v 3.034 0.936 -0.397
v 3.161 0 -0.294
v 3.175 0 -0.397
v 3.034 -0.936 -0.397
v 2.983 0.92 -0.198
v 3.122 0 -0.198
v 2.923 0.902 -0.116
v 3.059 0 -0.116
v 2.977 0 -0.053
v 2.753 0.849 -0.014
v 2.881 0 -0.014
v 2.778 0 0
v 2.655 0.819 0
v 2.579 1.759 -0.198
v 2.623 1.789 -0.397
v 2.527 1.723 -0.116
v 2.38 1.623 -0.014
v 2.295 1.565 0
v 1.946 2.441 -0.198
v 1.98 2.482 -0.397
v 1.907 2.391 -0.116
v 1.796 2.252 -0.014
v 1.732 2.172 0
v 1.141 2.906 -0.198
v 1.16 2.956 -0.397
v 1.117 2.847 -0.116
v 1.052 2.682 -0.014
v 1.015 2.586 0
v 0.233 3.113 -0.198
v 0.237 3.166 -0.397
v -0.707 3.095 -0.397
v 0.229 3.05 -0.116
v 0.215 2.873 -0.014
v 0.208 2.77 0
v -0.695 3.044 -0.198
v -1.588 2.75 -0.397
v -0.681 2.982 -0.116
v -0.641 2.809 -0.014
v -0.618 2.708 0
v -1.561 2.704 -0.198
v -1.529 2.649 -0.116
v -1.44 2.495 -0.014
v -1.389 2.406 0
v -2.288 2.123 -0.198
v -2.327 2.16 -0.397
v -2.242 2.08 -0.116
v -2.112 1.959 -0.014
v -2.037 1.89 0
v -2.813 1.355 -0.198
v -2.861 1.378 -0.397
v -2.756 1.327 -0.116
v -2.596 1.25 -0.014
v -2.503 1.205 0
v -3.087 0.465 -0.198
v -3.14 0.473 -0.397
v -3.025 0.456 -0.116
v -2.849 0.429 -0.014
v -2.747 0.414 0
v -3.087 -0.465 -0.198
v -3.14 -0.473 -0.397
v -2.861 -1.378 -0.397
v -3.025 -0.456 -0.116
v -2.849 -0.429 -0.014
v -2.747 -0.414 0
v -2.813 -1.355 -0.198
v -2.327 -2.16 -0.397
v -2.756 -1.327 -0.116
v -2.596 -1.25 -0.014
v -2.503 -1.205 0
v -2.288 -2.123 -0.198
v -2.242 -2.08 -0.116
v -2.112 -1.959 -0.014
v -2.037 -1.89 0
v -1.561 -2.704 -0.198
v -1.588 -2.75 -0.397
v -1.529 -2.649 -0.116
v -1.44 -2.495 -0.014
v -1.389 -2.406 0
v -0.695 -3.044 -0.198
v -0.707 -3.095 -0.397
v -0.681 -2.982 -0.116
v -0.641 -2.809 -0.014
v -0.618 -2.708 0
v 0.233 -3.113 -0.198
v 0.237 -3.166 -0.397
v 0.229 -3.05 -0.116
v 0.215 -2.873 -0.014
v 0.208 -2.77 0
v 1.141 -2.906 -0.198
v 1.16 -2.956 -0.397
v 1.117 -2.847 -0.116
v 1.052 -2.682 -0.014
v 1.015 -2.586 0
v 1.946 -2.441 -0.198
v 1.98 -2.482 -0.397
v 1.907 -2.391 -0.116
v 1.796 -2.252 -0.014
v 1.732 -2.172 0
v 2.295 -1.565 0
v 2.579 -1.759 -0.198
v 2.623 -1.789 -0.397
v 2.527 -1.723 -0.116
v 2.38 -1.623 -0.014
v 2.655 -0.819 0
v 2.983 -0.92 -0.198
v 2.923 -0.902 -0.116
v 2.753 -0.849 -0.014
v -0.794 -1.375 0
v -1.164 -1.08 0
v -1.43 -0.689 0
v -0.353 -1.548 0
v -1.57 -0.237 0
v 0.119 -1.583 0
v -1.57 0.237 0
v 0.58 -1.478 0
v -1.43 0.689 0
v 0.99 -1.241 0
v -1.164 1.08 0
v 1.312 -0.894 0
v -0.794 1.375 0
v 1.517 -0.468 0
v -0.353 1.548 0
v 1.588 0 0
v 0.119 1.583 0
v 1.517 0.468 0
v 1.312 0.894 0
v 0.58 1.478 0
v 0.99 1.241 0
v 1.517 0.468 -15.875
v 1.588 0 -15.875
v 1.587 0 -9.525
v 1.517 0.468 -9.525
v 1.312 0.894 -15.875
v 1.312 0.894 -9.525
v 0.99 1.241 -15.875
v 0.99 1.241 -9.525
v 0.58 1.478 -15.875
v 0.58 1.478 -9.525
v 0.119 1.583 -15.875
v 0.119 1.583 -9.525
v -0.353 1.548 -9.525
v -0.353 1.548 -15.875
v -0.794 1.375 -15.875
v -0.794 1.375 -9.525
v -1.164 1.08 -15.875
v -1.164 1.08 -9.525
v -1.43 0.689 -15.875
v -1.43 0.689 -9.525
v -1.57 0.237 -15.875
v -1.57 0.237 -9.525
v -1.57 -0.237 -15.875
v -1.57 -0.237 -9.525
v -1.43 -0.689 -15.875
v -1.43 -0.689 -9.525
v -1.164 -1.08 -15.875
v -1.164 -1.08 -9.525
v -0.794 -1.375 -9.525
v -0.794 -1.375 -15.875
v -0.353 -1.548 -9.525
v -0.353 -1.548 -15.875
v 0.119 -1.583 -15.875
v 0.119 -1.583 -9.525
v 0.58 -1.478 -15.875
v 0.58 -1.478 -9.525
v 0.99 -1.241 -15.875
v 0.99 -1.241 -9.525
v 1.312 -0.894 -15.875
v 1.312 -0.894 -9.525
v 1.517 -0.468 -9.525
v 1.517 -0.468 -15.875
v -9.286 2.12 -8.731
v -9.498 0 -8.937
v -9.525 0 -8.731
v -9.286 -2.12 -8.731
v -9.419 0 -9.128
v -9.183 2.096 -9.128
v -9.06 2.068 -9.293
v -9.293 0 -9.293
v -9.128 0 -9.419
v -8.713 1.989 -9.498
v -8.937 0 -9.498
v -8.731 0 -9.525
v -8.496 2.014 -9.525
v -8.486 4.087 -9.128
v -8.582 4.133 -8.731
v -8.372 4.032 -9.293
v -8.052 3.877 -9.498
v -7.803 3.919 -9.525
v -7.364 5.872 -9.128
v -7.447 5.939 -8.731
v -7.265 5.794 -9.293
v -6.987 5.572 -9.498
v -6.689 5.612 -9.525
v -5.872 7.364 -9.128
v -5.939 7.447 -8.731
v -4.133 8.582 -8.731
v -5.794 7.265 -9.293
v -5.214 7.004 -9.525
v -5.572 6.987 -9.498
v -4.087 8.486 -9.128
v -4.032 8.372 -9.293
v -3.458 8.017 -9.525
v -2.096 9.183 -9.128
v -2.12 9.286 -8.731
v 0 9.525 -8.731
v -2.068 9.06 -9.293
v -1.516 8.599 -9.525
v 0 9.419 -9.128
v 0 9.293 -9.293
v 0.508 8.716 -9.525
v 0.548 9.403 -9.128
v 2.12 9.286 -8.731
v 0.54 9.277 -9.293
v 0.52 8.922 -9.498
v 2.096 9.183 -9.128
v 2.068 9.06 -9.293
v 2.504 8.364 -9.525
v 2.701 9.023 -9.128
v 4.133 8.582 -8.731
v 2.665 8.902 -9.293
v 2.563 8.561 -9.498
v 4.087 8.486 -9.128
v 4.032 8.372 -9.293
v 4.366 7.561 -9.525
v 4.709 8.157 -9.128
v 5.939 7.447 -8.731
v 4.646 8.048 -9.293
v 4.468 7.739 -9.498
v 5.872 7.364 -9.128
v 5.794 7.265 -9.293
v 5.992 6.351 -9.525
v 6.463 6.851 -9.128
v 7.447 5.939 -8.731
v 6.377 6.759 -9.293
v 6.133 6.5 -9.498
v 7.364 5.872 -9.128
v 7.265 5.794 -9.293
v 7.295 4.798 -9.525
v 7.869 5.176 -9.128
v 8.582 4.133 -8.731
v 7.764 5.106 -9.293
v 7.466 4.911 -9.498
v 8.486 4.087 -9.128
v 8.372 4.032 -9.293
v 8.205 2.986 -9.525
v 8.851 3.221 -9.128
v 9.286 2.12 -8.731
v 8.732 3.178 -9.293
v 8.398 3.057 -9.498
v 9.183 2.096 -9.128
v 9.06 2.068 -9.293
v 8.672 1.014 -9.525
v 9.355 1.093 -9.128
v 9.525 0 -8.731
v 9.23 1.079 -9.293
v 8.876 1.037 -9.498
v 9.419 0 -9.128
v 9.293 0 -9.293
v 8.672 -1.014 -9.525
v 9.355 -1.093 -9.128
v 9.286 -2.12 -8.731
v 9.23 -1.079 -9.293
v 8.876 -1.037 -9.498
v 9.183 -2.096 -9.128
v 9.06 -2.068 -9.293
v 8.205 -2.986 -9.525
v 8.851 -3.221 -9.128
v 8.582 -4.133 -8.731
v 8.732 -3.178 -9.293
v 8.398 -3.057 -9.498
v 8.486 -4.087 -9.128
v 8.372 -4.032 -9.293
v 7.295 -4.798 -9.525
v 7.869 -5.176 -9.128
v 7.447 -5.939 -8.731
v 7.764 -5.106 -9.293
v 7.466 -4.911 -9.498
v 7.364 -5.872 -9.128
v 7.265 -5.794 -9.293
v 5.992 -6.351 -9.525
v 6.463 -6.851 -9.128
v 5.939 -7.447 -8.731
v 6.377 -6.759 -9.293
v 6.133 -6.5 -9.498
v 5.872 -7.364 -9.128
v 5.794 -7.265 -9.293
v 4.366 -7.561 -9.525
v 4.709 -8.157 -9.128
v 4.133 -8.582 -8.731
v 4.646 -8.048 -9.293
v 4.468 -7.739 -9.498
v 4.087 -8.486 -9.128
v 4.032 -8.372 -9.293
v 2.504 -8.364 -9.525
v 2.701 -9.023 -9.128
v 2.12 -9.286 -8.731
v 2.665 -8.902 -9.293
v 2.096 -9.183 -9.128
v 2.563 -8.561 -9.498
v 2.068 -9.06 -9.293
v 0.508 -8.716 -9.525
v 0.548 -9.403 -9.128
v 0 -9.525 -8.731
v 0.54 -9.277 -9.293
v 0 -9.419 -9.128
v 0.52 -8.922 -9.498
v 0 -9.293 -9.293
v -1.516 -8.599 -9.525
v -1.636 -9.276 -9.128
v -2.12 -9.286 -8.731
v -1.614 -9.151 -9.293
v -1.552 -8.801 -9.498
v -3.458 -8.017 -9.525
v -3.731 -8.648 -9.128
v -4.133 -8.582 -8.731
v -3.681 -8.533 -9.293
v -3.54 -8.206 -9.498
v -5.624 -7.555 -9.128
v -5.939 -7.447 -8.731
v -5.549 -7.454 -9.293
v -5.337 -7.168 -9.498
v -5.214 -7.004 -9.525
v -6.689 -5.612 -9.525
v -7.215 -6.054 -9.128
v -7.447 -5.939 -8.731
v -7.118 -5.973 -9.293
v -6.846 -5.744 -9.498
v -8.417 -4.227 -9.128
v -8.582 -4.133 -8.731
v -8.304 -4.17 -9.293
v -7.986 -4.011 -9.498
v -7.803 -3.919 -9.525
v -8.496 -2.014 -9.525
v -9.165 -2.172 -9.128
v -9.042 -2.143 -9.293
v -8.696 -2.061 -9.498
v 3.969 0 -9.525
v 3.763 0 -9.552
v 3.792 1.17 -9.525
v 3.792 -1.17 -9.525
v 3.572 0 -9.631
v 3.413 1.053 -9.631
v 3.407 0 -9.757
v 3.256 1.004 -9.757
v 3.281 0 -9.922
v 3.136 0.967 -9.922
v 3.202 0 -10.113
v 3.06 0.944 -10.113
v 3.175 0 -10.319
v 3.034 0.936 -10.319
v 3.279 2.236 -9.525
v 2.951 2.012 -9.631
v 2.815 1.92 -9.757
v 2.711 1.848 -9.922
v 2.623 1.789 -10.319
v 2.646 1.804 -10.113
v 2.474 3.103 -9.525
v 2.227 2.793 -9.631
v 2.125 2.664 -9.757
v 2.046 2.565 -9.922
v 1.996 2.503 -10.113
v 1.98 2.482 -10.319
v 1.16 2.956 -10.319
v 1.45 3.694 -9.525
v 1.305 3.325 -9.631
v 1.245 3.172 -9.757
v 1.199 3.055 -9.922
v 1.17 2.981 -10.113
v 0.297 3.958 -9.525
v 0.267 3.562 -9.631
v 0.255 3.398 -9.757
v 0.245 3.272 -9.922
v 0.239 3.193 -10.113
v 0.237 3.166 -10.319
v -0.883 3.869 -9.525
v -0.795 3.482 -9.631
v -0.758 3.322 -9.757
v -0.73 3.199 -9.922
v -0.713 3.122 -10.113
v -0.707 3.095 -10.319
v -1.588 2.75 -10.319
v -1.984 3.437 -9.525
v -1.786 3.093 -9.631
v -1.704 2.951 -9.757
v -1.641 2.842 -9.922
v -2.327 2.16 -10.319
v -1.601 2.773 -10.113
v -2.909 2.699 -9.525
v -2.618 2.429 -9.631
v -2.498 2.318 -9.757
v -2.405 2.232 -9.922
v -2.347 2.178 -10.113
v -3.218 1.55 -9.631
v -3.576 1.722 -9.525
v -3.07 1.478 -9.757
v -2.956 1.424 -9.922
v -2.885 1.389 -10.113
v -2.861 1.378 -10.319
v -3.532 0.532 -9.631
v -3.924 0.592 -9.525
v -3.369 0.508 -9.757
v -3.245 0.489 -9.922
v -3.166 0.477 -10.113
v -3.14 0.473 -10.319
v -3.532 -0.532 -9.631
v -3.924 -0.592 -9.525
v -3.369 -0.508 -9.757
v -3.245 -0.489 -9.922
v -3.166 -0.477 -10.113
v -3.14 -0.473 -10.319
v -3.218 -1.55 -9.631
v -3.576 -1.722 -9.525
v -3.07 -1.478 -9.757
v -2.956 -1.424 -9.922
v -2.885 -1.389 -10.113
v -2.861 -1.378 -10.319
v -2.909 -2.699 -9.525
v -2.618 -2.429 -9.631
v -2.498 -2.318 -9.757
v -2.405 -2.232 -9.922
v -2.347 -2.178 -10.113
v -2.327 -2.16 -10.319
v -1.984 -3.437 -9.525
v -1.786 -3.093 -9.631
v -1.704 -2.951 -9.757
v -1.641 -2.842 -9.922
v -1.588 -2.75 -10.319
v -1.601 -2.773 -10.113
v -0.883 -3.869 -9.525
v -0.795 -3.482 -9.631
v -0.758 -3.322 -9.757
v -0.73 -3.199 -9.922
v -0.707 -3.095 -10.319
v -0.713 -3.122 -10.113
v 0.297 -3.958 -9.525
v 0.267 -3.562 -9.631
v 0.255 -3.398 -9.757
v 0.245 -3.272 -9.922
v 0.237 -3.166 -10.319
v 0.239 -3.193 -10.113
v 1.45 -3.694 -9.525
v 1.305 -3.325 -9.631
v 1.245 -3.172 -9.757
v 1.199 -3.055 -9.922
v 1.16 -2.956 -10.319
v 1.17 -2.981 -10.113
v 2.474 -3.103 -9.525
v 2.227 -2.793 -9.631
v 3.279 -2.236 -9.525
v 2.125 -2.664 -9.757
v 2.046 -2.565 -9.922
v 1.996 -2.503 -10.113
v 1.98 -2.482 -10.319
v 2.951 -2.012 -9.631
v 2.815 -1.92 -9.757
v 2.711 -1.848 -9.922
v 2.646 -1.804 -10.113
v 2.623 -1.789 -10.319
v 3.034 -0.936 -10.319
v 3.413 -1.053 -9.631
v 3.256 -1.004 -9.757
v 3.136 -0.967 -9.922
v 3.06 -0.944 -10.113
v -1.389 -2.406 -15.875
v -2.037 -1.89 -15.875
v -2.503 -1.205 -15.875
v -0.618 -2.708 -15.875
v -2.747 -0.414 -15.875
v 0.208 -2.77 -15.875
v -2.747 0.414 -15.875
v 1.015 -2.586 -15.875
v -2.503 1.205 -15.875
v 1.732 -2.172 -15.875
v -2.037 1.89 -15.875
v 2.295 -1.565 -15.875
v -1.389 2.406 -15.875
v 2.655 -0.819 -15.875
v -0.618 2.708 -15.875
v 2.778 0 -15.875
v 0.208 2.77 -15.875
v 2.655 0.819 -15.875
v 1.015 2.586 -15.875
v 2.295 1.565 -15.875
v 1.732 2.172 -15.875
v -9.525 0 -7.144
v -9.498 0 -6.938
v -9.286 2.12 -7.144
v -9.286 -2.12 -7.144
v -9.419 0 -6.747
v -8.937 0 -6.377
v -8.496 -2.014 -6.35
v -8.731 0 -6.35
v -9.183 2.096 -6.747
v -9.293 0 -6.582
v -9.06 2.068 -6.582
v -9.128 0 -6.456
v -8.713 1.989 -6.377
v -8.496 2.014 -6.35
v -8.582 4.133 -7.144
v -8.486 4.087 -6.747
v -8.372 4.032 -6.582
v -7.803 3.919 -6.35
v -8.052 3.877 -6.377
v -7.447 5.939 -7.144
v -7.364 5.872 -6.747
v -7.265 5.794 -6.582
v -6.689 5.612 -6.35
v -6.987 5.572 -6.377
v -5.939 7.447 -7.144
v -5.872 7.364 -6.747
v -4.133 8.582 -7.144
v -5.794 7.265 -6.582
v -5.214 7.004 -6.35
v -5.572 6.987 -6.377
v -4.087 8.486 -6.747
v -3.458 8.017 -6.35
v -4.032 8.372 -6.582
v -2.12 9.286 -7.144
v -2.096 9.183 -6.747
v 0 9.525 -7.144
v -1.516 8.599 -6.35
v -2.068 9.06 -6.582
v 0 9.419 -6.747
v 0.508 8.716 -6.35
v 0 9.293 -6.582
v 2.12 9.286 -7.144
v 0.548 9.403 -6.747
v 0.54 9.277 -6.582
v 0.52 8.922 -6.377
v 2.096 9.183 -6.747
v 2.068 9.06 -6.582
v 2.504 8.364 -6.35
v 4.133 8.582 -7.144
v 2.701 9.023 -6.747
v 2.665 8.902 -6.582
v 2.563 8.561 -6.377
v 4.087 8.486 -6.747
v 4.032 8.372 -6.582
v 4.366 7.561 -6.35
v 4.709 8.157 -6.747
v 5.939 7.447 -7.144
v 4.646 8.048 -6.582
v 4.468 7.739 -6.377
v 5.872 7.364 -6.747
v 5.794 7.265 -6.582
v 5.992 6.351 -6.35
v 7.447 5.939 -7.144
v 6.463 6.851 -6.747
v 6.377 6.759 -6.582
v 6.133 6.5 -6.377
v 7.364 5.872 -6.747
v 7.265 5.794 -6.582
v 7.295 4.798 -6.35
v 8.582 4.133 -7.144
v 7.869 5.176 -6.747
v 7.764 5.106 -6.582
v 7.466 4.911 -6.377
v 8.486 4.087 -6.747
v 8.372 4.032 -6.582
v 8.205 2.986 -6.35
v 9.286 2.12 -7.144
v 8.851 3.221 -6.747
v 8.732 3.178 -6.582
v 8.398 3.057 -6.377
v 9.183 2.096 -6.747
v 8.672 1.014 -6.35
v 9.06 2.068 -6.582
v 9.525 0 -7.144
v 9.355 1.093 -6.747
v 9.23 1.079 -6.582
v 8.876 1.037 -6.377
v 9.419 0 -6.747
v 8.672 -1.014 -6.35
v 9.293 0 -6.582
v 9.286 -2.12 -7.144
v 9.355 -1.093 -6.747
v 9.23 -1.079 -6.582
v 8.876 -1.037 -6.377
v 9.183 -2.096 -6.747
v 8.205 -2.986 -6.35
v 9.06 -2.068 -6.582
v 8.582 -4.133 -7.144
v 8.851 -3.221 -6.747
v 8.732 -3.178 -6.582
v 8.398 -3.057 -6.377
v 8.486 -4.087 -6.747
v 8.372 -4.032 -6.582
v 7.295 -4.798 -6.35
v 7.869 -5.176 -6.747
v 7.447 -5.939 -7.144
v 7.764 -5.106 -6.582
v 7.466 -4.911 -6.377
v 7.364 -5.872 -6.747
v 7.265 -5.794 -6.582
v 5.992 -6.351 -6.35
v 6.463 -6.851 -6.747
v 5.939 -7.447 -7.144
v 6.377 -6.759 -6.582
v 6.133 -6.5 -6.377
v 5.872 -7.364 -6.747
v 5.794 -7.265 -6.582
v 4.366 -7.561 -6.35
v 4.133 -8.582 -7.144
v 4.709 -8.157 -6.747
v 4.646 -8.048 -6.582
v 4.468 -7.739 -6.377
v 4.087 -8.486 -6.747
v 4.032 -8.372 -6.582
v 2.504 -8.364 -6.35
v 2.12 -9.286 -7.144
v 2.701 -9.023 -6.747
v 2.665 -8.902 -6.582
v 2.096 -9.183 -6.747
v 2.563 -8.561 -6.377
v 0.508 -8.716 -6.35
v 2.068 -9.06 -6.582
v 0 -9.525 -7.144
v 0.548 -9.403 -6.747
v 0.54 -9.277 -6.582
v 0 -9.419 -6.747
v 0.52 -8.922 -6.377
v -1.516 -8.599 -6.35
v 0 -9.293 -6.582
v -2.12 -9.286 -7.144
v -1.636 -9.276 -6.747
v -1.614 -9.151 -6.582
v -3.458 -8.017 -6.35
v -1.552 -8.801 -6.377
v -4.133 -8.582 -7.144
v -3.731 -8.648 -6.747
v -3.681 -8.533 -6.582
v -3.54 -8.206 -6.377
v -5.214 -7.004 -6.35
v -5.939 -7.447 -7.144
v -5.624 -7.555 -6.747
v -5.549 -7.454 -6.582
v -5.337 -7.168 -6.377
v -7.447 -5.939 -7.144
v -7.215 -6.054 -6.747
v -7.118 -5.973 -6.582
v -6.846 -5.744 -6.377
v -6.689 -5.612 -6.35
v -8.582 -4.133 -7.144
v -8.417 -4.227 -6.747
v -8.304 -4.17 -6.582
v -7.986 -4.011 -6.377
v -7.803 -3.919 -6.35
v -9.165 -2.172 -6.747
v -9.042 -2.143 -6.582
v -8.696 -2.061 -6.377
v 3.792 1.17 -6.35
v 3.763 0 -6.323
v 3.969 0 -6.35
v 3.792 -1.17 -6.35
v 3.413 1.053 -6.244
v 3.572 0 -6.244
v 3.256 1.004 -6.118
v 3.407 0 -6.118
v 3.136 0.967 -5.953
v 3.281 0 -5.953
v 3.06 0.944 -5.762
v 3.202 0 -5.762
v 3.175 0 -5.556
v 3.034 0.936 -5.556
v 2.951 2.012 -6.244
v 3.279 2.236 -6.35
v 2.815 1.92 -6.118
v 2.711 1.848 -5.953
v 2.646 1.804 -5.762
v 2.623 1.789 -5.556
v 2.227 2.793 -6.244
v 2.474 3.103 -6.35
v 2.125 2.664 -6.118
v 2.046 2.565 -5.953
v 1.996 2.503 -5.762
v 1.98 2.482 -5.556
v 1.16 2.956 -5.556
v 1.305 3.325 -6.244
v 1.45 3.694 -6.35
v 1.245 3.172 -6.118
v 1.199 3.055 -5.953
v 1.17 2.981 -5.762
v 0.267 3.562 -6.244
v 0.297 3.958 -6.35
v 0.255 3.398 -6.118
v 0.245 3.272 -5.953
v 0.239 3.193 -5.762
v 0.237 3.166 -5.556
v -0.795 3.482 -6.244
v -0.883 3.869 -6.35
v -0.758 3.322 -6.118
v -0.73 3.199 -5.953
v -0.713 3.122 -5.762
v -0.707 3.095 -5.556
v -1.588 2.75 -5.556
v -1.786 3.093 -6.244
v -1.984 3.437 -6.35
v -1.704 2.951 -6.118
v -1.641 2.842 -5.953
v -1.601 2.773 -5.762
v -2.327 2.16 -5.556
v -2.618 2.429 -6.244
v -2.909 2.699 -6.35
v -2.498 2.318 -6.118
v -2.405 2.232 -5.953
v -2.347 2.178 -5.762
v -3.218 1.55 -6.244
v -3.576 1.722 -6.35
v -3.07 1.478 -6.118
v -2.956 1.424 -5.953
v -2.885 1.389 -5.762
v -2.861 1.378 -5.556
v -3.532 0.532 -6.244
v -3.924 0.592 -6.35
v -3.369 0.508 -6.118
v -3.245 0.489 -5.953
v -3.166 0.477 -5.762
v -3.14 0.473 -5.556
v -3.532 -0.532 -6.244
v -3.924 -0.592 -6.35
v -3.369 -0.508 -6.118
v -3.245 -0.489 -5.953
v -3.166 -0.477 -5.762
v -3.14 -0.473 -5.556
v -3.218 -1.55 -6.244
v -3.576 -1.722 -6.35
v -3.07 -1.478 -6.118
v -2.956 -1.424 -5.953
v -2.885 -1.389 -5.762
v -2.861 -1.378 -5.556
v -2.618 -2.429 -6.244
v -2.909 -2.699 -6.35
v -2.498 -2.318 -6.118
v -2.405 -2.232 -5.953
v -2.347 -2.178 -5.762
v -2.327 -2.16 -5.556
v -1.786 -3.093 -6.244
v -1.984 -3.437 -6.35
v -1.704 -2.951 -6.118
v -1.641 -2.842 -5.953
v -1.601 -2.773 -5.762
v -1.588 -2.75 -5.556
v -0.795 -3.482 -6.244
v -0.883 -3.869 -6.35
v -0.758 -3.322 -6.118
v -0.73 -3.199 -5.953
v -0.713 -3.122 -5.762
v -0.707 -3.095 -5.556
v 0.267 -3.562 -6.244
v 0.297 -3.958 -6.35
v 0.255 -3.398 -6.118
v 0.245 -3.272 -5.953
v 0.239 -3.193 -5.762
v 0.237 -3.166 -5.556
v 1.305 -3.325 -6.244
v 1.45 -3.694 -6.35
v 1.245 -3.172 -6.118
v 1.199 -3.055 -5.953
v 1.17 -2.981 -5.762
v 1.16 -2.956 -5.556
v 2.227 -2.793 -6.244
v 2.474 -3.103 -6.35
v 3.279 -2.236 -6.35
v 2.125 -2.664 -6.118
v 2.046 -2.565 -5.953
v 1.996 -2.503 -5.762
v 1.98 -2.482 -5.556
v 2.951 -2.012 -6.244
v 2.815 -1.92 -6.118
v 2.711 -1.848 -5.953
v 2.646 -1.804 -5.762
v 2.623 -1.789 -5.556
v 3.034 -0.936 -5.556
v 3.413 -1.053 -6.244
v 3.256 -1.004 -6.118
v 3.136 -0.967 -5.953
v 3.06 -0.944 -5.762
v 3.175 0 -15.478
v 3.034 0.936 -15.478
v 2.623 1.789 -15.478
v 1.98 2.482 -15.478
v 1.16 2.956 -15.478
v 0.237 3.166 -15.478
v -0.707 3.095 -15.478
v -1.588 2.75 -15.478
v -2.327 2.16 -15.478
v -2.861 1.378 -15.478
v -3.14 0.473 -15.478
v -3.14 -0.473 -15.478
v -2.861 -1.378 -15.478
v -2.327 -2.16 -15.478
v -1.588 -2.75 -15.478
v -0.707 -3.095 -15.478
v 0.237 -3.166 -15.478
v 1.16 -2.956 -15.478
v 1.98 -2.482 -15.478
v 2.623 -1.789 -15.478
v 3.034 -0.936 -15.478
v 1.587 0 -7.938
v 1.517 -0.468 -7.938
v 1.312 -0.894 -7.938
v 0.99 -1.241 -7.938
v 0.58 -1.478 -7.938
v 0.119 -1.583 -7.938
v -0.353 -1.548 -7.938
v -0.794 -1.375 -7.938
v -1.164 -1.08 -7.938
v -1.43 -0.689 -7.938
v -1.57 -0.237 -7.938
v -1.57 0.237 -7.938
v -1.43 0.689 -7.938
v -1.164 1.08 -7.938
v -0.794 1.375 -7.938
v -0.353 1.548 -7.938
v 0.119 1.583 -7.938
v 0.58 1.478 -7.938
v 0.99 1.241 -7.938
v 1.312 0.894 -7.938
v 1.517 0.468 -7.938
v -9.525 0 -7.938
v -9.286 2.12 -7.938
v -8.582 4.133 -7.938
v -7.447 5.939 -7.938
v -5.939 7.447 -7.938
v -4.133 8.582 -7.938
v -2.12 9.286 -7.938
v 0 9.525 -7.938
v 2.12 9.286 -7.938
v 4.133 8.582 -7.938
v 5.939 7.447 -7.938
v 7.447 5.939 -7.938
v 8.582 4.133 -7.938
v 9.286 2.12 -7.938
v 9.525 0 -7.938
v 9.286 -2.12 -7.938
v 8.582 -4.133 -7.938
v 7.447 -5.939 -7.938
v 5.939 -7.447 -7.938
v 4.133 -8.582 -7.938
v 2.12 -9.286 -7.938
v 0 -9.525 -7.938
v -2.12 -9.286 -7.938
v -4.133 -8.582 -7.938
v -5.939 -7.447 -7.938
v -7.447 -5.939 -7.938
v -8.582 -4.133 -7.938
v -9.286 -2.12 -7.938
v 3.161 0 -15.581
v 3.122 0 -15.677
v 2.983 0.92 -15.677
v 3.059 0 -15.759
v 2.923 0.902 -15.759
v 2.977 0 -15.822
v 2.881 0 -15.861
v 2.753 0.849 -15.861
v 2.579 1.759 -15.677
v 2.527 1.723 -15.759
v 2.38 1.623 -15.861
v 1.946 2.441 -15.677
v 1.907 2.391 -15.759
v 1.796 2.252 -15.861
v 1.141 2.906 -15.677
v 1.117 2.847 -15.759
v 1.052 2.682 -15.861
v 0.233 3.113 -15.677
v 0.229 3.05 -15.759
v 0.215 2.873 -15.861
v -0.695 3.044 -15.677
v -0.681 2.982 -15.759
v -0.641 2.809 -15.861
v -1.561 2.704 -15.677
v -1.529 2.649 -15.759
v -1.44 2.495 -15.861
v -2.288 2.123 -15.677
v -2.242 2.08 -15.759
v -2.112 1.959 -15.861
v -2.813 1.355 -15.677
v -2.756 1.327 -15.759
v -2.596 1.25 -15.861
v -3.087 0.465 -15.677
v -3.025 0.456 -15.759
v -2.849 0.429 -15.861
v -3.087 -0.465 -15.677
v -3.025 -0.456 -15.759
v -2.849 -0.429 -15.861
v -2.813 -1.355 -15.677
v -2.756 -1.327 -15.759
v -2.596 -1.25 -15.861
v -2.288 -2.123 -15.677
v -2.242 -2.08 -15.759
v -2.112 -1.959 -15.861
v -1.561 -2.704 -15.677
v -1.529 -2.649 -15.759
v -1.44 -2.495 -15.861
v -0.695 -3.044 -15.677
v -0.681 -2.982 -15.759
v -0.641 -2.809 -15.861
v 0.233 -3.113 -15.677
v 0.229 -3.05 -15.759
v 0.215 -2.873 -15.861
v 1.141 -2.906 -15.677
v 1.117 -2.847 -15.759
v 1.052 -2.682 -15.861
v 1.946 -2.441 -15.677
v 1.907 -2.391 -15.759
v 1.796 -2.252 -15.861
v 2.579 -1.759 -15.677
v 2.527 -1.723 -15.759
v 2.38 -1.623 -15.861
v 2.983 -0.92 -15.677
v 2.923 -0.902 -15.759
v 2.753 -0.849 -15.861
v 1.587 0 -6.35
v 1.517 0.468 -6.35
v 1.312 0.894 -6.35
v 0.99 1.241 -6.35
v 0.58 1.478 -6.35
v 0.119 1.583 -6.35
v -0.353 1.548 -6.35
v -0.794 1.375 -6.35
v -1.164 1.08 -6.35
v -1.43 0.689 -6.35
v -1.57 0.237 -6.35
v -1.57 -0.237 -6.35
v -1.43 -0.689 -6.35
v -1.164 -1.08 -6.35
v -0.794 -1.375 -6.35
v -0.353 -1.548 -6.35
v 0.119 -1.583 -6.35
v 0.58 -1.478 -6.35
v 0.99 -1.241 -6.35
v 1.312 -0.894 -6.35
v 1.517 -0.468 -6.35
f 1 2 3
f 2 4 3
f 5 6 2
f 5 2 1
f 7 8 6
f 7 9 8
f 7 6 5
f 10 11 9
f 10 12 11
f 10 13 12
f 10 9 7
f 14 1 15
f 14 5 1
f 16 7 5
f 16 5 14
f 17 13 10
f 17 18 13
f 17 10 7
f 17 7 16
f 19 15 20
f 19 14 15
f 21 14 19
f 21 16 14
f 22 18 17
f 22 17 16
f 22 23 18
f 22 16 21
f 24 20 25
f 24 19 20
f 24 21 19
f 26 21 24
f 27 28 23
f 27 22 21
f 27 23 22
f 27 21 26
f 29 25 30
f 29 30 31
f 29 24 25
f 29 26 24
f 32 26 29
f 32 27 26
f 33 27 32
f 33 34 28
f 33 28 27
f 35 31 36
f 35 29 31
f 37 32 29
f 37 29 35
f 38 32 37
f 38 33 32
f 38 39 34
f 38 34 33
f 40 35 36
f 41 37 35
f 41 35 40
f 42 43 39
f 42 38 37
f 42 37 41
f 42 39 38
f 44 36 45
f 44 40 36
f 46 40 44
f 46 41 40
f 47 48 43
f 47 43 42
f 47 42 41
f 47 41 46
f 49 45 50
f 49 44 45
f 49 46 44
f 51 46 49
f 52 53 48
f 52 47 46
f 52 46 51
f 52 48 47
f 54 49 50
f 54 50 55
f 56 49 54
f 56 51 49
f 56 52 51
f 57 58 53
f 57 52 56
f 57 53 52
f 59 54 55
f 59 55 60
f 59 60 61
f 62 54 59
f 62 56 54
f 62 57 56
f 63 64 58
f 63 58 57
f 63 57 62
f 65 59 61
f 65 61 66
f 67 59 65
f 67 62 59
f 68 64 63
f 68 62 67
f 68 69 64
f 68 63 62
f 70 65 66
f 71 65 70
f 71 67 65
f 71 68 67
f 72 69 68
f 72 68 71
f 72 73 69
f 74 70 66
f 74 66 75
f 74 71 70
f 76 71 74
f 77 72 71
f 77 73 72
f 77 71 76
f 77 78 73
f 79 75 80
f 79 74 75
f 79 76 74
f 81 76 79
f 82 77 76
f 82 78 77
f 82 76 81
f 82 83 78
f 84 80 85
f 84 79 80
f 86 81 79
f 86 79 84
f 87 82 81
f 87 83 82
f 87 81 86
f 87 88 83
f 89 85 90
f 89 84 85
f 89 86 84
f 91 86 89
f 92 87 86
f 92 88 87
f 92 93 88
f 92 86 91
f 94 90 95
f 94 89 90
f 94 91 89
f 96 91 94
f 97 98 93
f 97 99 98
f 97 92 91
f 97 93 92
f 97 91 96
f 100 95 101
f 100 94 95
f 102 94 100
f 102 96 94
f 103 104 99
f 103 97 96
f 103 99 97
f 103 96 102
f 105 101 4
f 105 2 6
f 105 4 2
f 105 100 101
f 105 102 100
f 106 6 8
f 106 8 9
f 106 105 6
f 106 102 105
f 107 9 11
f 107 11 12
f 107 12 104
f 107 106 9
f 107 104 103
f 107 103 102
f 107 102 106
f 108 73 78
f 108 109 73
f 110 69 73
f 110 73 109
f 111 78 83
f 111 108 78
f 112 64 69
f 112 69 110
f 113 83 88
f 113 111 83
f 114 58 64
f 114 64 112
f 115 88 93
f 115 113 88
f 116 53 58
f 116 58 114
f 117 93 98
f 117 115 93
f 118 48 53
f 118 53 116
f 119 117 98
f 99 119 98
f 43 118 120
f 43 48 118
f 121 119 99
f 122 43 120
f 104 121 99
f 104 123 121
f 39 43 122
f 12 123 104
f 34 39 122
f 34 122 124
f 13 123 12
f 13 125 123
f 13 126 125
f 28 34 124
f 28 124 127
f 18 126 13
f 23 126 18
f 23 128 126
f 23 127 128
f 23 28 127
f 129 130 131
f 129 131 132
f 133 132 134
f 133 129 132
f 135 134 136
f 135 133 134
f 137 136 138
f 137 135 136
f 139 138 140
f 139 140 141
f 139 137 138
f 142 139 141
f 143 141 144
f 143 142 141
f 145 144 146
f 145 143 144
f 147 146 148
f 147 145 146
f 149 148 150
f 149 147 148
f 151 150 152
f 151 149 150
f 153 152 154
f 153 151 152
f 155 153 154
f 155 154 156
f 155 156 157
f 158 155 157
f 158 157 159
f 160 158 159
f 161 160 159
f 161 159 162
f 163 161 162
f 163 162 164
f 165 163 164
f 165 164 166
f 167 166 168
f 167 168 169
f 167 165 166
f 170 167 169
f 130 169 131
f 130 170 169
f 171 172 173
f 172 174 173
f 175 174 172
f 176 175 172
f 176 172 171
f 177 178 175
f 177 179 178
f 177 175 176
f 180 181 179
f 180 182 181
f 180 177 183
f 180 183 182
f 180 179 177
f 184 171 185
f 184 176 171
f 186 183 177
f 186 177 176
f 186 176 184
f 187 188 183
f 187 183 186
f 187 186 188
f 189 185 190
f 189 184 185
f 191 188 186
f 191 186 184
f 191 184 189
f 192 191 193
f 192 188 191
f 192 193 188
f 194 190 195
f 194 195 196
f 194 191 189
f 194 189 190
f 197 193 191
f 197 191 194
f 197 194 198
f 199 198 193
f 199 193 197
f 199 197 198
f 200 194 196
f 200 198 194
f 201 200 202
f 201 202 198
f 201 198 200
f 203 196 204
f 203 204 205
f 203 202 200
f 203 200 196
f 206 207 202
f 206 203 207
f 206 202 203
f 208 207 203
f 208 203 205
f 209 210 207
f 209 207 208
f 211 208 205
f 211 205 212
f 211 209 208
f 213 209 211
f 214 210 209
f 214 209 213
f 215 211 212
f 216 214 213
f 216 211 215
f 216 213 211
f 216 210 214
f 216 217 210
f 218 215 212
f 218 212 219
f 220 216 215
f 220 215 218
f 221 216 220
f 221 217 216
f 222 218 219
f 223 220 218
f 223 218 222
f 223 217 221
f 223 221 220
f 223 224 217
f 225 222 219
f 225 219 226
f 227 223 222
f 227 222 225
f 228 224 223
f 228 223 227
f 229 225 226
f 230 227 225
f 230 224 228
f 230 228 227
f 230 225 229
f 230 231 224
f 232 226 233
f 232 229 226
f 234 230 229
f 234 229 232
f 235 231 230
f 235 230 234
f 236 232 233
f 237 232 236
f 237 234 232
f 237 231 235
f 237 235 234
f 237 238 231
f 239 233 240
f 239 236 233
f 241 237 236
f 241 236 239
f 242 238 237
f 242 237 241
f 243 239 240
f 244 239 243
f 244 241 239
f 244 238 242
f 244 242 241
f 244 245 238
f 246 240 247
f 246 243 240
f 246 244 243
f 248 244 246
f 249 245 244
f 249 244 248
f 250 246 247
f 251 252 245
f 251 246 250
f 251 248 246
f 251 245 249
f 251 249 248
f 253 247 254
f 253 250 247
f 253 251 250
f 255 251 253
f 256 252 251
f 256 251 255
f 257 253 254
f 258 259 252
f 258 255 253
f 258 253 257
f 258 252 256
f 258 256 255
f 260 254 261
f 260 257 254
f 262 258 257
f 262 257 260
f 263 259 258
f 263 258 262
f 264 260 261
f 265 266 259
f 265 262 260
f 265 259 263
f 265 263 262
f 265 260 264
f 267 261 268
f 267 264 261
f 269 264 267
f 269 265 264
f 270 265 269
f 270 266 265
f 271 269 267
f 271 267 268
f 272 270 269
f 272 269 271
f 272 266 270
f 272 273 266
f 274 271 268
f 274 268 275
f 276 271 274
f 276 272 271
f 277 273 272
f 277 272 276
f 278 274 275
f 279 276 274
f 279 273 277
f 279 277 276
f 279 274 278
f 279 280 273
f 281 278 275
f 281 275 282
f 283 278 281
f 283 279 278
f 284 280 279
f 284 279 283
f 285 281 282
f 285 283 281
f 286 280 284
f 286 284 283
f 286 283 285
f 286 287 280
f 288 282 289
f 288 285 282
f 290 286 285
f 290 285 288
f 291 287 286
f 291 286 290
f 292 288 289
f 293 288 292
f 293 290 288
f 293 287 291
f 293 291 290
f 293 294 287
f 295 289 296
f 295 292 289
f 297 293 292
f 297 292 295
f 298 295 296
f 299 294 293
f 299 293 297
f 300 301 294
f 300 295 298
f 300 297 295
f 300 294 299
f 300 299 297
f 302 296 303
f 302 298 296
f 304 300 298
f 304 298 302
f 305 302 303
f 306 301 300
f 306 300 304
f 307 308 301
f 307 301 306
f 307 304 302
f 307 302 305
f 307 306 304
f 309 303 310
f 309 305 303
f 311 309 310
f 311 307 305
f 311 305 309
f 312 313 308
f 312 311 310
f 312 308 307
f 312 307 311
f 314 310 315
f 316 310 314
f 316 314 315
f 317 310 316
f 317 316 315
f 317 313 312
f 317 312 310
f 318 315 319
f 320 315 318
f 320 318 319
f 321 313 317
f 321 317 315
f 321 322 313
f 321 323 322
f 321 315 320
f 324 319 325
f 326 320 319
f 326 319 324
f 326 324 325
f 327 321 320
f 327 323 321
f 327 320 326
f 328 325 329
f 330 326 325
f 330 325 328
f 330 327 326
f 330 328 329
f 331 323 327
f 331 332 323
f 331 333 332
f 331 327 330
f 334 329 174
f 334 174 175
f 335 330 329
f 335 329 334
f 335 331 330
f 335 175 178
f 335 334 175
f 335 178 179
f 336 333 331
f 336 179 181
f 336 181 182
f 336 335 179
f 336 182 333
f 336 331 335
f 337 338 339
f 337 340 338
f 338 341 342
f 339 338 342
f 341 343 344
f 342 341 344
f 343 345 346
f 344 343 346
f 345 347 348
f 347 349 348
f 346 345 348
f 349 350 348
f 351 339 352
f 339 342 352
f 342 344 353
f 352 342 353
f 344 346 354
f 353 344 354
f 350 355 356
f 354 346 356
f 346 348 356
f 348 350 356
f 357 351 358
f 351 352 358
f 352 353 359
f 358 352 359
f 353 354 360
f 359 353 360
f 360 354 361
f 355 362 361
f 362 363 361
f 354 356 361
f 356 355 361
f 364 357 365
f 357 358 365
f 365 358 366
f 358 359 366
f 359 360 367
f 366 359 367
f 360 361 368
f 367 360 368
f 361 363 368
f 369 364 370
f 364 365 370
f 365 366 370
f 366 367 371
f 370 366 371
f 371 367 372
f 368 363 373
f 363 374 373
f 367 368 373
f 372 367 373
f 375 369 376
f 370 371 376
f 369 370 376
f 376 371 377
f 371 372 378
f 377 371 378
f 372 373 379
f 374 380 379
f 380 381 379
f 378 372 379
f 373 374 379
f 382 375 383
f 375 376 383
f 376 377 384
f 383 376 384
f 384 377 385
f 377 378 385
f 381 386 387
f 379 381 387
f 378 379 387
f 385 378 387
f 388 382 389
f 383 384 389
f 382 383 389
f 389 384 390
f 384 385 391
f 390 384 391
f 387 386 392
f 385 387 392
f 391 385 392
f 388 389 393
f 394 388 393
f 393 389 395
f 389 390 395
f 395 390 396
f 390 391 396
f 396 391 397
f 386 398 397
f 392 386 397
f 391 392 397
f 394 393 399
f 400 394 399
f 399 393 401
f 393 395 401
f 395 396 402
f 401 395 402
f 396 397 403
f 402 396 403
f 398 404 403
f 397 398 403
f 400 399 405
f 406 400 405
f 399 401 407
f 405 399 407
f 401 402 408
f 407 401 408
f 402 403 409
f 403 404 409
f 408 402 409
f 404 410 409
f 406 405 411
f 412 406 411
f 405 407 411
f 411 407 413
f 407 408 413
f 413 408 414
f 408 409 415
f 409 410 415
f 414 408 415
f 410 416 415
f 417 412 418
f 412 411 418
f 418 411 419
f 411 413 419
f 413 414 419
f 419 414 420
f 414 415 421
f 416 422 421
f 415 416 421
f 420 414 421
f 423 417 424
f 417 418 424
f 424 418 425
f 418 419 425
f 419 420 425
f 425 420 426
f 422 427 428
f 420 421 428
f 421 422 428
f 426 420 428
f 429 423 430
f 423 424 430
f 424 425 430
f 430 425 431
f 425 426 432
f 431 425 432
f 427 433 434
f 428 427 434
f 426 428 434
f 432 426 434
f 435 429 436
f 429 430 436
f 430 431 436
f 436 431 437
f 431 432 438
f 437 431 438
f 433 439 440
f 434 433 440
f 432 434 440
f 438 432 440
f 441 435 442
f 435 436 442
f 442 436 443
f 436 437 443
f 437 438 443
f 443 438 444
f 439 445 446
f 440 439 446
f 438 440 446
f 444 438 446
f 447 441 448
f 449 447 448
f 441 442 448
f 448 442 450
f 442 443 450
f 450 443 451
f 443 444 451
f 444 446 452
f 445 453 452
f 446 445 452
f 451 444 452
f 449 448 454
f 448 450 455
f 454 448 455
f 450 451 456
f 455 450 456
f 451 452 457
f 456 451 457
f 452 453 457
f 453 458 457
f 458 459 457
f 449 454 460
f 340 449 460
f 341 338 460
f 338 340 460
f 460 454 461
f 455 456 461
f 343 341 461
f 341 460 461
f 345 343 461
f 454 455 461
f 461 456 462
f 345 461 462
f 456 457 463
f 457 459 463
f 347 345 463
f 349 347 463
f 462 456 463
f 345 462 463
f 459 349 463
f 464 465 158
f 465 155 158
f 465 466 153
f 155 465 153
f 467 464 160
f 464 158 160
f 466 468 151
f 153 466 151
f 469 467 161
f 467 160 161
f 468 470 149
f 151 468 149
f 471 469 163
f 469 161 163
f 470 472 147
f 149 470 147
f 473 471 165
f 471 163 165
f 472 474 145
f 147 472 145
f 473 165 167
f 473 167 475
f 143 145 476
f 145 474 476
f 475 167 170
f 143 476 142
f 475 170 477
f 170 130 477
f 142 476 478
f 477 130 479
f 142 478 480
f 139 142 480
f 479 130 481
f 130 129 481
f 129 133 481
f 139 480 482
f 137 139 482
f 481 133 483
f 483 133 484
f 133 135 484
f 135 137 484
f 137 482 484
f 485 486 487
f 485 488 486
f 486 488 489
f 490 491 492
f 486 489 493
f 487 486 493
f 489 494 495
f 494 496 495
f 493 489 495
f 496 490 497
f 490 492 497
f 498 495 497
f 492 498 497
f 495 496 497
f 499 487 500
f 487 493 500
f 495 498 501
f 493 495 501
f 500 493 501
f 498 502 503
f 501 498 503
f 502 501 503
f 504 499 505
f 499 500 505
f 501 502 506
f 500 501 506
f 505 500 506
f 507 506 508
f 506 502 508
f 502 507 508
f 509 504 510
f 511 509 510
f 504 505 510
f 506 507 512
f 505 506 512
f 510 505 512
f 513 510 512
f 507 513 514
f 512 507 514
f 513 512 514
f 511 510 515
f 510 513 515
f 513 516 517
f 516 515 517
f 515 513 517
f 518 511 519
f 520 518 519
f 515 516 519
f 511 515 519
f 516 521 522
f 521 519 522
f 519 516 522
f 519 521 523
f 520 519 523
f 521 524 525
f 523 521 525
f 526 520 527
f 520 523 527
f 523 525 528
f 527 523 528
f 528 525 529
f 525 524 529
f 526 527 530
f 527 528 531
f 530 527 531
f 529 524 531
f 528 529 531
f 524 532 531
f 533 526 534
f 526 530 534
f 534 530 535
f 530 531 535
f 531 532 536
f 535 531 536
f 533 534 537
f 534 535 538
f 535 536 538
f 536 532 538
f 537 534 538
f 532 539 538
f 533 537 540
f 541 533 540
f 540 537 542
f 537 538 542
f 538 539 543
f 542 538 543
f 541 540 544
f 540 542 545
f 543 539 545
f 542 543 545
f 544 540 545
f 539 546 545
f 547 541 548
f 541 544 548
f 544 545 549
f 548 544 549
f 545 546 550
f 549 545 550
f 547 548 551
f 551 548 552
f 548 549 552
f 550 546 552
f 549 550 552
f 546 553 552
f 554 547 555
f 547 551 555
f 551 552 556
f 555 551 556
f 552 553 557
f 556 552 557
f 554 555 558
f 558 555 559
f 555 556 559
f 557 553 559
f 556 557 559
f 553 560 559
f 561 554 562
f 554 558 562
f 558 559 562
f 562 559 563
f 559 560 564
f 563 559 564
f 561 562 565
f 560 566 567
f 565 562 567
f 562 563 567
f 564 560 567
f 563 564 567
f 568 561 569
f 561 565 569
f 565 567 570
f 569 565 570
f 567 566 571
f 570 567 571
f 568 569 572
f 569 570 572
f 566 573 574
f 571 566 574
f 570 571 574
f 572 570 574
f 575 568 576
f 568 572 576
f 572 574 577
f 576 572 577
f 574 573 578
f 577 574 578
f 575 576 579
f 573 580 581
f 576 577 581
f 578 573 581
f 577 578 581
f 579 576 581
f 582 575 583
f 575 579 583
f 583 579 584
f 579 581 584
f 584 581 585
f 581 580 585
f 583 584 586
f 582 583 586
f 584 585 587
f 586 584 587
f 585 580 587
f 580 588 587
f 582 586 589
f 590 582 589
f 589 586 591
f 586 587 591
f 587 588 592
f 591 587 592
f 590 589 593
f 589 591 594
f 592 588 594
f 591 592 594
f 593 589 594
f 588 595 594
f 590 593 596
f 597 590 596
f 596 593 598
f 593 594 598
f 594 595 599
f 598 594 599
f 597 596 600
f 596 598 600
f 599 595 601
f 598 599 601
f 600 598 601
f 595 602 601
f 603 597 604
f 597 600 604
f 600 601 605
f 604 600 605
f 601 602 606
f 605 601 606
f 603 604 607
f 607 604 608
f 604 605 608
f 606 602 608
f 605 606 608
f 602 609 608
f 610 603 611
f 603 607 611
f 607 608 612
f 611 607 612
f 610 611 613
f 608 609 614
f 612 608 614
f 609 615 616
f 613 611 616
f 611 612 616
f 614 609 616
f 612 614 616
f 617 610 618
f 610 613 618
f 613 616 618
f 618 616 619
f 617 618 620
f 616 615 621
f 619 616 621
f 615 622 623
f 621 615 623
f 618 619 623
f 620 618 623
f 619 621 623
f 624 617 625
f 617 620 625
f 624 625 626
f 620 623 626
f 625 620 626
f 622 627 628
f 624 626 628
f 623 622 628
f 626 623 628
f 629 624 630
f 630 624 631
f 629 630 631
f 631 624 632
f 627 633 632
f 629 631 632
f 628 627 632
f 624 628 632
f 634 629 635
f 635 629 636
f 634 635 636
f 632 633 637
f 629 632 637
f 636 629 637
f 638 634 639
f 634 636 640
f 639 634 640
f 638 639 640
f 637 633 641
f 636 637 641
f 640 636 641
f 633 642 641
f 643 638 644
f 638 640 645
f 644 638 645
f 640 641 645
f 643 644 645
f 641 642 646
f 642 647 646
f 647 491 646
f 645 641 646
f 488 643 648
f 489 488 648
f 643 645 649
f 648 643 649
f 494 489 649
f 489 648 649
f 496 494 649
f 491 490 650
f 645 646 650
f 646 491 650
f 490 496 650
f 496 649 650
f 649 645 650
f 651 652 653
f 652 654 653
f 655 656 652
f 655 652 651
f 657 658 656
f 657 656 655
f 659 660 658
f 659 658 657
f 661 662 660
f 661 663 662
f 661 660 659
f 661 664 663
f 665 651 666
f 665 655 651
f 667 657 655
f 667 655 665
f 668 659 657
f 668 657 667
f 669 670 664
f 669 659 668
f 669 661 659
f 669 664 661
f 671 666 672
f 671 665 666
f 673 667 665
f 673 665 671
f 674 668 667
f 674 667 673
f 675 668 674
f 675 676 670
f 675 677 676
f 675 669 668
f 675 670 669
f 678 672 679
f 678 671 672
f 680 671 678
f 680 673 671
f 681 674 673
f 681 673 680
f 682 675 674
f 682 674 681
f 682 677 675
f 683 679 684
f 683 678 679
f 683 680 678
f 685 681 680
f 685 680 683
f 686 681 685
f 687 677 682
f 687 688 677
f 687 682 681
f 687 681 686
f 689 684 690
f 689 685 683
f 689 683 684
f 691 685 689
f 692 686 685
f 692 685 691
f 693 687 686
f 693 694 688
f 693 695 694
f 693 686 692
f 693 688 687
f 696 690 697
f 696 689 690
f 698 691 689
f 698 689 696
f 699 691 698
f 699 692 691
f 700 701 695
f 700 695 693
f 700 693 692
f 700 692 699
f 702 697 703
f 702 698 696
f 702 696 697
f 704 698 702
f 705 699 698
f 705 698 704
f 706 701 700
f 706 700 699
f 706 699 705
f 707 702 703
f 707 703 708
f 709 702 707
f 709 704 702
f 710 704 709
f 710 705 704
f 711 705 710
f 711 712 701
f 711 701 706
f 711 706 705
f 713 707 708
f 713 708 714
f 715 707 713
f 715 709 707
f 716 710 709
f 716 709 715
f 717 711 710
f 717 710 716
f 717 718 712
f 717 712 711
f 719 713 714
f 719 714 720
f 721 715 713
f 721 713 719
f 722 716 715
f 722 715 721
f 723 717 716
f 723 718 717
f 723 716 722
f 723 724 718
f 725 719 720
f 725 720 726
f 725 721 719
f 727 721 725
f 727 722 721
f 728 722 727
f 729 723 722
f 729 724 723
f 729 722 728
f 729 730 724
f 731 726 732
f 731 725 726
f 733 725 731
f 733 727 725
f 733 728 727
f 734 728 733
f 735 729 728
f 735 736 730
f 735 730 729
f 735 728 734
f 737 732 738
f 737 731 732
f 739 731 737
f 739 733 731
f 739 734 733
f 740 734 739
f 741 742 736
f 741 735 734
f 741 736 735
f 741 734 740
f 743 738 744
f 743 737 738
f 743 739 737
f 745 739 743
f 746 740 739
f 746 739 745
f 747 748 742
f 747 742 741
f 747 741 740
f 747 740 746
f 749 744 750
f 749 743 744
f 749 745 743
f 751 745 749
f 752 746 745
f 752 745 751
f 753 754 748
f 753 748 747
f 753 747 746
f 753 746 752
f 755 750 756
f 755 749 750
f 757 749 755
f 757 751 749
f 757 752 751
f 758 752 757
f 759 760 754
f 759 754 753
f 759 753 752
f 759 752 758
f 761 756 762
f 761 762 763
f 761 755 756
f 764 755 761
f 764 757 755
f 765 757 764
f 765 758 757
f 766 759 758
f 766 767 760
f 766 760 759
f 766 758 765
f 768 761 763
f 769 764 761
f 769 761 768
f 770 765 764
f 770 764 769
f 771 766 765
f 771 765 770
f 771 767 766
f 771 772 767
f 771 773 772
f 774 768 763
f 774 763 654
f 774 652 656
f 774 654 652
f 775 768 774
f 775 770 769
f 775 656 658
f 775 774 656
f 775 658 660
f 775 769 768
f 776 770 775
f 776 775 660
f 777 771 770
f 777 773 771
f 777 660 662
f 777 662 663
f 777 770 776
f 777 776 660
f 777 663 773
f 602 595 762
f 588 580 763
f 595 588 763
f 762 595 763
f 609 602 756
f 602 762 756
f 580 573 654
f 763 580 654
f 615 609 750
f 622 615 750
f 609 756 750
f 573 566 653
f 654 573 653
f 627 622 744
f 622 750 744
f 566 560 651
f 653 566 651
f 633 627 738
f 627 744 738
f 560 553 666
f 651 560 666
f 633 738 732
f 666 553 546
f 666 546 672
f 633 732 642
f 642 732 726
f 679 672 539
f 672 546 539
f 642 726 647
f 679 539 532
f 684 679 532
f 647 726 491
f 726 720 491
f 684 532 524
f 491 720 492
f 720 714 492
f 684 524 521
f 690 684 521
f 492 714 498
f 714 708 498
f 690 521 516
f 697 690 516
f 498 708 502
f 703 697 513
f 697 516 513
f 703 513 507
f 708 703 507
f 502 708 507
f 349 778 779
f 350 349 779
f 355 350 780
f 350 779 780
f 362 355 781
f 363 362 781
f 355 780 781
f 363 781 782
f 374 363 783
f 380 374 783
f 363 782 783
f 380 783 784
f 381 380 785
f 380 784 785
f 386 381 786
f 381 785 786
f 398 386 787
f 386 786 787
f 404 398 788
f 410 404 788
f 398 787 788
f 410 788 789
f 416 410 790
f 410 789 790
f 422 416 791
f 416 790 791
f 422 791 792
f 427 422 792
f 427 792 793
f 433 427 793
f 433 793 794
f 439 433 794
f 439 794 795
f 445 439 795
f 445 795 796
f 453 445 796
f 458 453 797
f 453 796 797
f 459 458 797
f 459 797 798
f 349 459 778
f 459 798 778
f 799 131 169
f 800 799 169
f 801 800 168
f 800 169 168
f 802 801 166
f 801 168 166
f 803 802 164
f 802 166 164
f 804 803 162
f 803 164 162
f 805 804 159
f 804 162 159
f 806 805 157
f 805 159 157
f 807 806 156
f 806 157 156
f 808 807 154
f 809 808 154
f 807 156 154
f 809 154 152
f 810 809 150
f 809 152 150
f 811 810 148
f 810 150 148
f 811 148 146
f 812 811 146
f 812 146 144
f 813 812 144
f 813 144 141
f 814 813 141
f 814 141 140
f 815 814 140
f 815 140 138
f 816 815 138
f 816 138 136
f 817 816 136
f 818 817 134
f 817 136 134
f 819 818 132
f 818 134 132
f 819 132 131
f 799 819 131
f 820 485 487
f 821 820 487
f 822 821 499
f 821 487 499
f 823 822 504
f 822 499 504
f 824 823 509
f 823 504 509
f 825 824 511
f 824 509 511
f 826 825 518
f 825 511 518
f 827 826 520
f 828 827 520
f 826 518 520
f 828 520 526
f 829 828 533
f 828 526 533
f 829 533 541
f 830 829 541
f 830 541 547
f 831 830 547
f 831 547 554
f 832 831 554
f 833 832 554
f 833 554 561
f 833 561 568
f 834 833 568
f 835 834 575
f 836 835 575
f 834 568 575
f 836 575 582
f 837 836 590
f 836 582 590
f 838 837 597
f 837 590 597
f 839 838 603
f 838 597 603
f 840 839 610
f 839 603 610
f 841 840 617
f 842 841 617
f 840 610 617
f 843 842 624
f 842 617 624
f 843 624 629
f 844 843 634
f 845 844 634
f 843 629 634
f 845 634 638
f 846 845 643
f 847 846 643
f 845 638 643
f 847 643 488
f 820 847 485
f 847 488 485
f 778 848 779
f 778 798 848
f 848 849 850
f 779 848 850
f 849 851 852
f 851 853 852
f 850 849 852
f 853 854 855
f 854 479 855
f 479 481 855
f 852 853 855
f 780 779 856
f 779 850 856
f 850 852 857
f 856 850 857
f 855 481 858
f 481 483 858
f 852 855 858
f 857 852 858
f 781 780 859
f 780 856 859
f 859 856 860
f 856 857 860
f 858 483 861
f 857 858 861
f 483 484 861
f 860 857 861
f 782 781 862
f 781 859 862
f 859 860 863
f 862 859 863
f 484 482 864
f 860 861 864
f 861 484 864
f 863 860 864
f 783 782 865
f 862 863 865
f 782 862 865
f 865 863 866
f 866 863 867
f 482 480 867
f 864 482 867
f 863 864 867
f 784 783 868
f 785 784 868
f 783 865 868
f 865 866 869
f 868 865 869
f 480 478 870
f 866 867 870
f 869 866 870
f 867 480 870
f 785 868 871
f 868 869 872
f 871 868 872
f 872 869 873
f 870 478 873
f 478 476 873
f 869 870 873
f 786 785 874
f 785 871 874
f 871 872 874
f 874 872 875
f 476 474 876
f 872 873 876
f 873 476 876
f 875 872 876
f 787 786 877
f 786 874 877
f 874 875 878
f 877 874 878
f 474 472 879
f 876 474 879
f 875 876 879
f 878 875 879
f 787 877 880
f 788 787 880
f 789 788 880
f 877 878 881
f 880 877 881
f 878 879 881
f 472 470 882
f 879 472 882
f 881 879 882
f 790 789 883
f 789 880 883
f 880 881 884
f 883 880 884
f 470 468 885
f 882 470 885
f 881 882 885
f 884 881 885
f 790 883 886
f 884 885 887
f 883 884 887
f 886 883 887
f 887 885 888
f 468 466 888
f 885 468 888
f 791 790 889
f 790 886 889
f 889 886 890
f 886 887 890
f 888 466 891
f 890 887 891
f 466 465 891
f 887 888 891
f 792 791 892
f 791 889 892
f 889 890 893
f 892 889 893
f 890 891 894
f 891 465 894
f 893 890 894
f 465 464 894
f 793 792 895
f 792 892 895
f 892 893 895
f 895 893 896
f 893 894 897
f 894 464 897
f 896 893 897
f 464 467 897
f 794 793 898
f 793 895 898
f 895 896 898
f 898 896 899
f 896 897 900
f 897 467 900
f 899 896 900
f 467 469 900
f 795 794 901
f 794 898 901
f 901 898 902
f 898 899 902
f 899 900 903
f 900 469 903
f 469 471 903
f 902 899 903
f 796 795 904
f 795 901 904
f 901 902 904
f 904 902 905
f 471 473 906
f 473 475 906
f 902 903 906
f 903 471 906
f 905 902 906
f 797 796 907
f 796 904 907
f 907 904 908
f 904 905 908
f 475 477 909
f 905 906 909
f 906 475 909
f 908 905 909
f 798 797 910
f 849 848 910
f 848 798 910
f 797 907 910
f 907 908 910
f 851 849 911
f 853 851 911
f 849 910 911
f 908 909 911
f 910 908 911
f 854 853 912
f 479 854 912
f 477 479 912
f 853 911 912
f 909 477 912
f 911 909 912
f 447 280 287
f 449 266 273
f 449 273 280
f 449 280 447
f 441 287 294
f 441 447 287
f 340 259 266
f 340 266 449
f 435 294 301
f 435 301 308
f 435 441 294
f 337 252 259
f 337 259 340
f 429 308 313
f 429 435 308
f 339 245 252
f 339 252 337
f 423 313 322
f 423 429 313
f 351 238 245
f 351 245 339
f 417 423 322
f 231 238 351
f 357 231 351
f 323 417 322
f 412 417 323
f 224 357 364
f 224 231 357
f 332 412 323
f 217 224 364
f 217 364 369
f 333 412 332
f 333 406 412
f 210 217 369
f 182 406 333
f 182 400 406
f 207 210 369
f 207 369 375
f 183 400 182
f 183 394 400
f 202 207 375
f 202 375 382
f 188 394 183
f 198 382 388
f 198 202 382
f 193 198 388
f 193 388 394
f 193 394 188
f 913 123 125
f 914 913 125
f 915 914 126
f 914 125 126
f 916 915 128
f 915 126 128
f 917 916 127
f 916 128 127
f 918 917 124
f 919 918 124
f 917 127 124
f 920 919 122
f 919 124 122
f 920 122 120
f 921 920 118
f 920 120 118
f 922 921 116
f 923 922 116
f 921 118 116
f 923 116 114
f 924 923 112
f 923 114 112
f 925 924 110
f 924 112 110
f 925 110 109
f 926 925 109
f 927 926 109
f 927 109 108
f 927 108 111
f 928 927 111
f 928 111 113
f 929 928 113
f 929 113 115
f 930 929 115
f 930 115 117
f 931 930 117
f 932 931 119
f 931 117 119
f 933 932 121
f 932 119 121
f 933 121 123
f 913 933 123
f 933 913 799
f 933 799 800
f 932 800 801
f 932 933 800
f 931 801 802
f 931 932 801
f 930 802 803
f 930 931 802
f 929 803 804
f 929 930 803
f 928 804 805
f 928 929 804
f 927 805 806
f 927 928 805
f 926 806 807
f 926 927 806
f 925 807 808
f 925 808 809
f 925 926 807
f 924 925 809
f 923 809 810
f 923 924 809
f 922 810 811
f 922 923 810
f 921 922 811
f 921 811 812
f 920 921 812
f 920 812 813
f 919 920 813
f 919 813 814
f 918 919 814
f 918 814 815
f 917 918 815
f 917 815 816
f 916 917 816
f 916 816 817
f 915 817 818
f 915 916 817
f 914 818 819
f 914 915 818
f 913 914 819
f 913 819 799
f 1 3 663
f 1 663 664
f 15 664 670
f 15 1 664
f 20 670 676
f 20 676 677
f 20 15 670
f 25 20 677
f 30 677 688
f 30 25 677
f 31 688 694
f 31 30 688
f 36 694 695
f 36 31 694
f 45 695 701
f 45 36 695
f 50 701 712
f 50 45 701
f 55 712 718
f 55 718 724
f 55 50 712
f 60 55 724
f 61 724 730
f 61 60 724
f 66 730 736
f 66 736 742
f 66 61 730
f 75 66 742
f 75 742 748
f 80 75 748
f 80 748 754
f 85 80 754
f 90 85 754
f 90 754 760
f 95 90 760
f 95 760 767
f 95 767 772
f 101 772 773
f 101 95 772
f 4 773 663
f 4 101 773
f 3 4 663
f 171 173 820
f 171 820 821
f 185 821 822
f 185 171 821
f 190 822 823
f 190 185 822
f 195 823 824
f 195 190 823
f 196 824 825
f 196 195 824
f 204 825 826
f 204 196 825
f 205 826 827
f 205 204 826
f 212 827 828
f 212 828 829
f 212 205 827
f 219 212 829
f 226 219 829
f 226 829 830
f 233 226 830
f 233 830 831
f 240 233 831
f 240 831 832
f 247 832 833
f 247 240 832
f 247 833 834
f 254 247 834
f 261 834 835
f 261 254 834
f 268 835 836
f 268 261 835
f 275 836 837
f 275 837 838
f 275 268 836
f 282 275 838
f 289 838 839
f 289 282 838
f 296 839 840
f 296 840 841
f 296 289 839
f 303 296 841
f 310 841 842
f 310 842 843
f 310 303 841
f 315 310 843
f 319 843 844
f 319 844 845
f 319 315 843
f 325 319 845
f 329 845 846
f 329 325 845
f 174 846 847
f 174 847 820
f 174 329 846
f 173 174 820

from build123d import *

# Parameters (mm, degrees)
SKETCH1_R           = 3.175
SKETCH1_R_2         = 1.5875
BOSS_EXTRUDE1_DEPTH = 6.35
SKETCH2_R           = 9.525
SKETCH2_R_2         = 1.5875
BOSS_EXTRUDE2_DEPTH = 1.5875
FILLET1_R           = 0.79375
FILLET2_R           = 0.79375
FILLET3_R           = 0.396875


with BuildPart() as part:
    # Sketch1 → Boss-Extrude1 (new body)
    with BuildSketch(Plane.XY):
        Circle(SKETCH1_R)
        Circle(SKETCH1_R_2, mode=Mode.SUBTRACT)
    boss_extrude1 = extrude(amount=-BOSS_EXTRUDE1_DEPTH)

    # Sketch2 → Boss-Extrude2 (add)
    with BuildSketch(Plane(origin=(0, 0, -6.35), x_dir=(-1, 0, 0), z_dir=(0, 0, -1))):
        Circle(SKETCH2_R)
        with Locations(Location((0, 0, 0), (0, 0, 180))):
            Circle(SKETCH2_R_2, mode=Mode.SUBTRACT)
    boss_extrude2 = extrude(amount=BOSS_EXTRUDE2_DEPTH)

    # Mirror1: Boss-Extrude1, Boss-Extrude2 across plane
    add(boss_extrude1.mirror(Plane(origin=(0, 0, -7.9375), x_dir=(1, 0, 0), z_dir=(0, 0, -1))))
    add(boss_extrude2.mirror(Plane(origin=(0, 0, -7.9375), x_dir=(1, 0, 0), z_dir=(0, 0, -1))))

    # Fillet1
    fillet1_edges = [part.edges().sort_by_distance(p)[0] for p in [
        (9.525, 0, -6.35),
        (9.525, 0, -9.525),
    ]]
    fillet(fillet1_edges, radius=FILLET1_R)

    # Fillet2
    fillet2_edges = [part.edges().sort_by_distance(p)[0] for p in [
        (-3.175, 0, -9.525),
        (-3.175, 0, -6.35),
    ]]
    fillet(fillet2_edges, radius=FILLET2_R)

    # Fillet3
    fillet3_edges = [part.edges().sort_by_distance(p)[0] for p in [
        (-3.175, 0, -15.875),
        (-3.175, 0, 0),
    ]]
    fillet(fillet3_edges, radius=FILLET3_R)


solid = part.part
